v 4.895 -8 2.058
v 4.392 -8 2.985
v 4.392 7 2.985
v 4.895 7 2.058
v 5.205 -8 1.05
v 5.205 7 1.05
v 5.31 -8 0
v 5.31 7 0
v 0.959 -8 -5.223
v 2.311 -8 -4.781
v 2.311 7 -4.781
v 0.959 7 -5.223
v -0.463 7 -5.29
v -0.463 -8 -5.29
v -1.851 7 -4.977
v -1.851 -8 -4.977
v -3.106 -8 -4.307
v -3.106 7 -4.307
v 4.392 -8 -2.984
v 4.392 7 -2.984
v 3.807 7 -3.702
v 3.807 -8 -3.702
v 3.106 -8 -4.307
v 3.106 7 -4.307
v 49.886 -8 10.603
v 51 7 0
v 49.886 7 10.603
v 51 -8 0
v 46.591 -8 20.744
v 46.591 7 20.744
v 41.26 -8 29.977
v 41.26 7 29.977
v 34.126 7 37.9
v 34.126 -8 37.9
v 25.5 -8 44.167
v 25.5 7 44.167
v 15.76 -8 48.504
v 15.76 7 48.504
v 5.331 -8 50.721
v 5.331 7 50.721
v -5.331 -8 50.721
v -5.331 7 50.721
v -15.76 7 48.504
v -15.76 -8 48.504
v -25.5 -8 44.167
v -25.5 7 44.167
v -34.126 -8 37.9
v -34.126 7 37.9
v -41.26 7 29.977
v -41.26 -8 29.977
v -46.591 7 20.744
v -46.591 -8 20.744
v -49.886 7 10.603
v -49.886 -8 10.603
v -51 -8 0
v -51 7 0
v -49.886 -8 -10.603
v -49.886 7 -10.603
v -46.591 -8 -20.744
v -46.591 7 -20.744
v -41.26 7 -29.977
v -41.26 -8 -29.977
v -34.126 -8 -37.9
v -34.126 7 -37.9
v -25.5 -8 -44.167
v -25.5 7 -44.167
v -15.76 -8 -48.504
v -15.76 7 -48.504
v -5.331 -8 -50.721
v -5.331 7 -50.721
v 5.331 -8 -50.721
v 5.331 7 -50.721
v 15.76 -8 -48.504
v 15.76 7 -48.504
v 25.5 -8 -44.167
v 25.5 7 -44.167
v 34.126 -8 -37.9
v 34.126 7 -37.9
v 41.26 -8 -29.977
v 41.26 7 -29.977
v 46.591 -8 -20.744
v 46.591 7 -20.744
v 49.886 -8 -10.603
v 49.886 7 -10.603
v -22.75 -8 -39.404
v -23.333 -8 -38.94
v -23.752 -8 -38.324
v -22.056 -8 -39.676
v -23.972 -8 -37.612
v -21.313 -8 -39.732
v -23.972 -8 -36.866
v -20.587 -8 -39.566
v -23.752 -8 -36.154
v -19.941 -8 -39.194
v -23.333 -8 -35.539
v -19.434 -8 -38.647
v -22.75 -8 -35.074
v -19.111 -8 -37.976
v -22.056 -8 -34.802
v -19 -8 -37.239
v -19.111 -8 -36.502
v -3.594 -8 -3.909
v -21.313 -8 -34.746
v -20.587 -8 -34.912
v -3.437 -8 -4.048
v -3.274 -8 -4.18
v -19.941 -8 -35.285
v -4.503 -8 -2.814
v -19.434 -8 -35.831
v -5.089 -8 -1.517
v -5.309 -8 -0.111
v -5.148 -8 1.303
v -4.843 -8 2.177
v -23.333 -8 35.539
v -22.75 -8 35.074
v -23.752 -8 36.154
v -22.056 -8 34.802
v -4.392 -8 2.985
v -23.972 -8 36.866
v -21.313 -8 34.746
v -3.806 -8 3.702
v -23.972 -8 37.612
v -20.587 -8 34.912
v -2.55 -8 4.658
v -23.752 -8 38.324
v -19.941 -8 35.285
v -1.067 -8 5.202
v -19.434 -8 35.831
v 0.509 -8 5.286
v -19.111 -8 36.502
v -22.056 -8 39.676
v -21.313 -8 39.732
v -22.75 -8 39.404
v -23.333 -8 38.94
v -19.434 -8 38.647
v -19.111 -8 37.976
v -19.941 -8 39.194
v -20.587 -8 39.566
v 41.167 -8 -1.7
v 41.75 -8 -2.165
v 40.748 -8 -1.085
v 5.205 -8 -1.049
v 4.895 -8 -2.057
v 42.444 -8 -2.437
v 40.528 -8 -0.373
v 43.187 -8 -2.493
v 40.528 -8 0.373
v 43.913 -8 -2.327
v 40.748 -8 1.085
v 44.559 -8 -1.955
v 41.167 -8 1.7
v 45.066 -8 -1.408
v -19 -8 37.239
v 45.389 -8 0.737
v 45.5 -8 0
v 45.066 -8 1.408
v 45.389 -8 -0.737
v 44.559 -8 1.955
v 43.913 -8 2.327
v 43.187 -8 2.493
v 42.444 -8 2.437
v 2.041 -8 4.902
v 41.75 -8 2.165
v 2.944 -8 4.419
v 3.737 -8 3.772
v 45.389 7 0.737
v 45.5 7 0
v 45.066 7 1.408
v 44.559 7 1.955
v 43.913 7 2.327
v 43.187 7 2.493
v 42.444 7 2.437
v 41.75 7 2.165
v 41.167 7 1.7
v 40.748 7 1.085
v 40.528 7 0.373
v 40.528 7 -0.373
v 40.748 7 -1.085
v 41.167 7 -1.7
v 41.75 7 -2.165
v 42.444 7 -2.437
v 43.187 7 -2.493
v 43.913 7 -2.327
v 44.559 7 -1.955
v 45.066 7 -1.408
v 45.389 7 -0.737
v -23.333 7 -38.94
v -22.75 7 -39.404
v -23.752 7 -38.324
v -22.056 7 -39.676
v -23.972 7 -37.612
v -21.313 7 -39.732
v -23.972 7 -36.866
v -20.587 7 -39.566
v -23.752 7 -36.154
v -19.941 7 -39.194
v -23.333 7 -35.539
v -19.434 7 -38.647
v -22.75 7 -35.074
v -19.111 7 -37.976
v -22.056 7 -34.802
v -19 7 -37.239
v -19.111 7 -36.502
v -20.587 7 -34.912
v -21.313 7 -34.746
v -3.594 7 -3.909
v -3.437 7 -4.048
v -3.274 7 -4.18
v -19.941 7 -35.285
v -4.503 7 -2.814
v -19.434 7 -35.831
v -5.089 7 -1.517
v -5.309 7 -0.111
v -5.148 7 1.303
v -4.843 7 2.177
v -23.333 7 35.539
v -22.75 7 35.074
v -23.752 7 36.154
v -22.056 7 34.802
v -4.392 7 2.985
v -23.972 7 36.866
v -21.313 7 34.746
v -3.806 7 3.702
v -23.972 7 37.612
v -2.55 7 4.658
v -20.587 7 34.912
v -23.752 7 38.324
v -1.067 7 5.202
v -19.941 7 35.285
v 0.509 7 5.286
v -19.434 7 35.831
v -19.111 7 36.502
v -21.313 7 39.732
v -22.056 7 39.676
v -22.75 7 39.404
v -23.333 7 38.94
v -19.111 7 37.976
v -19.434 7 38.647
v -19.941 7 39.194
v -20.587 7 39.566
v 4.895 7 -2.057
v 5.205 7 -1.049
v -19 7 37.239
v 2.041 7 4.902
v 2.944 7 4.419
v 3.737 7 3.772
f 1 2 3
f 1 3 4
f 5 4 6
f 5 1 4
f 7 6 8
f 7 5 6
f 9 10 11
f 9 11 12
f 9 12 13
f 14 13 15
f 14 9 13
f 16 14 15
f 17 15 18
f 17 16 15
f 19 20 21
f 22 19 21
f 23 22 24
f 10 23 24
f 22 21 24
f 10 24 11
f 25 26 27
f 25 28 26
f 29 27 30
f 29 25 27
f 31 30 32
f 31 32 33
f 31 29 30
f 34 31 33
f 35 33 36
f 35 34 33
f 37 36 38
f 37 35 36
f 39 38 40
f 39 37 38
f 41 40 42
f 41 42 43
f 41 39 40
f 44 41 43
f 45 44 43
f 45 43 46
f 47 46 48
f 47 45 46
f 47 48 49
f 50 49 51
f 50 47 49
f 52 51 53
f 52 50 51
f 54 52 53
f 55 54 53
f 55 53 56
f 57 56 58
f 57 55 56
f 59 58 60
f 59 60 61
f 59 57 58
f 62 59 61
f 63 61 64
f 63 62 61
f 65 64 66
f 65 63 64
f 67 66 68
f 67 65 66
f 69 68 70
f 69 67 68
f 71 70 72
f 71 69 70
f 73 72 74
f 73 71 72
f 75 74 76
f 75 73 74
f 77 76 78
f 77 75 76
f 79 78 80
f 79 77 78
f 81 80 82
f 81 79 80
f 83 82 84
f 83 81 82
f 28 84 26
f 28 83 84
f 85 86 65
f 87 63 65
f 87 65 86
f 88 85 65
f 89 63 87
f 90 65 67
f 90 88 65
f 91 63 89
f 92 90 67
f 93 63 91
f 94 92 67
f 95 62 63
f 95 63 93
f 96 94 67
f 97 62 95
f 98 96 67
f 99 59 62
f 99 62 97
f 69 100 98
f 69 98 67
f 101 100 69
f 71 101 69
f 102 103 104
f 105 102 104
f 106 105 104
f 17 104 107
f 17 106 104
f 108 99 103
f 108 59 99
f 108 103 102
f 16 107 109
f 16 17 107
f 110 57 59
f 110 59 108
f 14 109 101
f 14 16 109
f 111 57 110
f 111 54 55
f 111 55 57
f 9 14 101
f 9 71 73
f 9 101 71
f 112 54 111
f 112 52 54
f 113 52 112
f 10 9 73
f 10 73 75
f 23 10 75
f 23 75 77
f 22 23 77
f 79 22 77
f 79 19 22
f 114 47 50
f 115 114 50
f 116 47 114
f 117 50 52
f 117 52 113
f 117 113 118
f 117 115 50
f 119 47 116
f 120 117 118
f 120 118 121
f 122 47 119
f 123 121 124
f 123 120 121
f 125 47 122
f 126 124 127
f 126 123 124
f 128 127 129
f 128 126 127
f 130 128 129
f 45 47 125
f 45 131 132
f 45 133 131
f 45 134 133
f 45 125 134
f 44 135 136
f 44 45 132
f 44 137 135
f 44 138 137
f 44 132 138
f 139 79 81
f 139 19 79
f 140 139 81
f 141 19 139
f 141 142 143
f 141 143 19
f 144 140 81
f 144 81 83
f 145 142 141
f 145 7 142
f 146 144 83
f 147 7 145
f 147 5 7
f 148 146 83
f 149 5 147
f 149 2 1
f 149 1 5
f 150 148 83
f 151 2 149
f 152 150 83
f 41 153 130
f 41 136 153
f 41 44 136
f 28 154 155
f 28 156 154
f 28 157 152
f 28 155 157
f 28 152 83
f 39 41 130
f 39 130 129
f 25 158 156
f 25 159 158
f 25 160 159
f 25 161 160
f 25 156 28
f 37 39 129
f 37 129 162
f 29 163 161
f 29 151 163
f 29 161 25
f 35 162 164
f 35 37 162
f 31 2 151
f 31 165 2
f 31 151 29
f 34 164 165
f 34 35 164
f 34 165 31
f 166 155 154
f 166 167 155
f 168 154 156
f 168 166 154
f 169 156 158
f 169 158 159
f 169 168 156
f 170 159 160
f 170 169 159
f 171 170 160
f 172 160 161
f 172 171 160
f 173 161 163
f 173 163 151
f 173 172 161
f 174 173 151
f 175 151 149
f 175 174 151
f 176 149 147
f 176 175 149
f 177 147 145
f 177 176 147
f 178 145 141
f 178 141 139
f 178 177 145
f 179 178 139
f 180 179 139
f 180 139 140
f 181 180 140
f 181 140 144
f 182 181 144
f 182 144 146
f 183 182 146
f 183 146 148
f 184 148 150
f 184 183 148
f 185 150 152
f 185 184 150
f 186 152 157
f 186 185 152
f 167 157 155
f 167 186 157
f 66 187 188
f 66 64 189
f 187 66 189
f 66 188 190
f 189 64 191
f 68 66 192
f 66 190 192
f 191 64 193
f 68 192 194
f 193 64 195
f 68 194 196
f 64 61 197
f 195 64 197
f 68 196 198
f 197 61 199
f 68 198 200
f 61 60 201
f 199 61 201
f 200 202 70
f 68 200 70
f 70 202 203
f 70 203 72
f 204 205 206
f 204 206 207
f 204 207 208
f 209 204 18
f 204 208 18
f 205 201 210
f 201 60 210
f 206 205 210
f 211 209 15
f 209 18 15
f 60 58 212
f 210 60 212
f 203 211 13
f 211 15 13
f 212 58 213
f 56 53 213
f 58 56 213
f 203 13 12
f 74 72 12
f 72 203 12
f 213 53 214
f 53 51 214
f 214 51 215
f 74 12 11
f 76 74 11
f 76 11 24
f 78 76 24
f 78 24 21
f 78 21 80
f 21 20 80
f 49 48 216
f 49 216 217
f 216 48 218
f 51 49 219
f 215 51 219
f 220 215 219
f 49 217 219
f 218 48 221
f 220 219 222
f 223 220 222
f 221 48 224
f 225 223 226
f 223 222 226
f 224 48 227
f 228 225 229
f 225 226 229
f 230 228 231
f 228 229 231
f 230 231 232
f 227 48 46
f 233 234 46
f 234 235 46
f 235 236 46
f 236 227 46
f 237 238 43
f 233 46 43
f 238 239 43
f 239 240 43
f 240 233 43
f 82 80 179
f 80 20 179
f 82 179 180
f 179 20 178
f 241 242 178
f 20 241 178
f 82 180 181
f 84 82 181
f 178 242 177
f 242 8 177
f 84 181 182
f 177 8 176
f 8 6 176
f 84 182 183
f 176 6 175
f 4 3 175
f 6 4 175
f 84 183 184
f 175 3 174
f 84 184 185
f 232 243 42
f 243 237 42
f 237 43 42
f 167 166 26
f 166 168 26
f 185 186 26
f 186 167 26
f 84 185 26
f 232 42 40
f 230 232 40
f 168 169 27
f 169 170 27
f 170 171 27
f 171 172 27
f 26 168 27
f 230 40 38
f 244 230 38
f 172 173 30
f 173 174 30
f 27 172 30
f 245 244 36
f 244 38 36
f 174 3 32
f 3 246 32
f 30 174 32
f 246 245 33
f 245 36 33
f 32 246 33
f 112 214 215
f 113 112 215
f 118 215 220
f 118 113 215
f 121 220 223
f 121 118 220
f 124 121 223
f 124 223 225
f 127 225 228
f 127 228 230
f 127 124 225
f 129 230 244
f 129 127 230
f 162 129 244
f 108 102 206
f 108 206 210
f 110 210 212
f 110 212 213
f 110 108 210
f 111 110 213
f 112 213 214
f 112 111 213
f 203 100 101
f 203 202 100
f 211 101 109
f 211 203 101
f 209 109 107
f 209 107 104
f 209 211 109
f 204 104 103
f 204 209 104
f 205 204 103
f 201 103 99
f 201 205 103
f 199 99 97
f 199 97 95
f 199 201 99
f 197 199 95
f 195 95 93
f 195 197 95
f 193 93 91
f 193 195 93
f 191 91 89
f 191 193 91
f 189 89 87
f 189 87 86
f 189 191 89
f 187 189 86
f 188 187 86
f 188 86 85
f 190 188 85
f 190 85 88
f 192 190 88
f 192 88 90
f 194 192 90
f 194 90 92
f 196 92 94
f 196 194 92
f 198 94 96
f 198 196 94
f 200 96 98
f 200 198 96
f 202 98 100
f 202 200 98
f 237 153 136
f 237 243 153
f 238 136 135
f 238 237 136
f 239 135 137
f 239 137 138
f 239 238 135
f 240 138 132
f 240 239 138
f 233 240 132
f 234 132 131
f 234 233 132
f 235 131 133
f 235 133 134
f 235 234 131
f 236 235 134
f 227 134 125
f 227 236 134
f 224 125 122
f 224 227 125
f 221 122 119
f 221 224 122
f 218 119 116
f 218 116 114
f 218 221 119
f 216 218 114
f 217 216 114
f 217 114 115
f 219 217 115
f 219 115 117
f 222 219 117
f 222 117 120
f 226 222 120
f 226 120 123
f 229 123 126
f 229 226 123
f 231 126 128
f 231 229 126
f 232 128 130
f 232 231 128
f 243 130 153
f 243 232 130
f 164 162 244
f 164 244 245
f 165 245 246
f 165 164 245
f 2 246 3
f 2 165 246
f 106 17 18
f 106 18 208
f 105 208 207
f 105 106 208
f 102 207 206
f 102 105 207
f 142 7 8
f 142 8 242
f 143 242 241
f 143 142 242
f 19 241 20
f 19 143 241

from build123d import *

# Parameters (mm, degrees)
F0_R          = 51
F0_R_2        = 2.5
F1_DEPTH      = 8
F1_DEPTH_BACK = 7
F2_R          = 57.85
F2_R_2        = 55.35
F3_DEPTH      = 3


with BuildPart() as f1:
    # F0 (on Front) → F1 (new body, two sides)
    with BuildSketch(Plane.XZ) as f1_sk:
        Circle(F0_R)
        with Locations((-21.5, -37.239092)):
            Circle(F0_R_2, mode=Mode.SUBTRACT)
        with Locations((-21.5, 37.239092)):
            Circle(F0_R_2, mode=Mode.SUBTRACT)
        with BuildLine():
            ThreePointArc((2.041061, 4.902058), (3.356125, 4.114915), (4.391594, 2.984962))
            ThreePointArc((4.391594, 2.984962), (5.075208, 1.561527), (5.31, 0))
            ThreePointArc((5.31, 0), (5.075312, -1.561189), (4.391992, -2.984377))
            ThreePointArc((4.391992, -2.984377), (3.469883, -4.019454), (2.311288, -4.780591))
            ThreePointArc((2.311288, -4.780591), (-0.462852, -5.289789), (-3.106405, -4.306547))
            ThreePointArc((-3.106405, -4.306547), (-3.356125, -4.114915), (-3.594051, -3.908823))
            ThreePointArc((-3.594051, -3.908823), (-5.088714, -1.516936), (-5.147666, 1.302933))
            ThreePointArc((-5.147666, 1.302933), (-4.635012, 2.5909), (-3.806465, 3.702286))
            ThreePointArc((-3.806465, 3.702286), (-1.067252, 5.201641), (2.041061, 4.902058))
        make_face(mode=Mode.SUBTRACT)
        with Locations((43, 0)):
            Circle(F0_R_2, mode=Mode.SUBTRACT)
    extrude(amount=F1_DEPTH)
    extrude(f1_sk.sketch, amount=-F1_DEPTH_BACK)

    # F2 (on face) → F3 (cut)
    with BuildSketch(Plane(origin=(0, 7, 0), x_dir=(-1, 0, 0), z_dir=(0, 1, 0))):
        Circle(F2_R)
        Circle(F2_R_2, mode=Mode.SUBTRACT)
    extrude(amount=-F3_DEPTH, mode=Mode.SUBTRACT)


solid = f1.part
